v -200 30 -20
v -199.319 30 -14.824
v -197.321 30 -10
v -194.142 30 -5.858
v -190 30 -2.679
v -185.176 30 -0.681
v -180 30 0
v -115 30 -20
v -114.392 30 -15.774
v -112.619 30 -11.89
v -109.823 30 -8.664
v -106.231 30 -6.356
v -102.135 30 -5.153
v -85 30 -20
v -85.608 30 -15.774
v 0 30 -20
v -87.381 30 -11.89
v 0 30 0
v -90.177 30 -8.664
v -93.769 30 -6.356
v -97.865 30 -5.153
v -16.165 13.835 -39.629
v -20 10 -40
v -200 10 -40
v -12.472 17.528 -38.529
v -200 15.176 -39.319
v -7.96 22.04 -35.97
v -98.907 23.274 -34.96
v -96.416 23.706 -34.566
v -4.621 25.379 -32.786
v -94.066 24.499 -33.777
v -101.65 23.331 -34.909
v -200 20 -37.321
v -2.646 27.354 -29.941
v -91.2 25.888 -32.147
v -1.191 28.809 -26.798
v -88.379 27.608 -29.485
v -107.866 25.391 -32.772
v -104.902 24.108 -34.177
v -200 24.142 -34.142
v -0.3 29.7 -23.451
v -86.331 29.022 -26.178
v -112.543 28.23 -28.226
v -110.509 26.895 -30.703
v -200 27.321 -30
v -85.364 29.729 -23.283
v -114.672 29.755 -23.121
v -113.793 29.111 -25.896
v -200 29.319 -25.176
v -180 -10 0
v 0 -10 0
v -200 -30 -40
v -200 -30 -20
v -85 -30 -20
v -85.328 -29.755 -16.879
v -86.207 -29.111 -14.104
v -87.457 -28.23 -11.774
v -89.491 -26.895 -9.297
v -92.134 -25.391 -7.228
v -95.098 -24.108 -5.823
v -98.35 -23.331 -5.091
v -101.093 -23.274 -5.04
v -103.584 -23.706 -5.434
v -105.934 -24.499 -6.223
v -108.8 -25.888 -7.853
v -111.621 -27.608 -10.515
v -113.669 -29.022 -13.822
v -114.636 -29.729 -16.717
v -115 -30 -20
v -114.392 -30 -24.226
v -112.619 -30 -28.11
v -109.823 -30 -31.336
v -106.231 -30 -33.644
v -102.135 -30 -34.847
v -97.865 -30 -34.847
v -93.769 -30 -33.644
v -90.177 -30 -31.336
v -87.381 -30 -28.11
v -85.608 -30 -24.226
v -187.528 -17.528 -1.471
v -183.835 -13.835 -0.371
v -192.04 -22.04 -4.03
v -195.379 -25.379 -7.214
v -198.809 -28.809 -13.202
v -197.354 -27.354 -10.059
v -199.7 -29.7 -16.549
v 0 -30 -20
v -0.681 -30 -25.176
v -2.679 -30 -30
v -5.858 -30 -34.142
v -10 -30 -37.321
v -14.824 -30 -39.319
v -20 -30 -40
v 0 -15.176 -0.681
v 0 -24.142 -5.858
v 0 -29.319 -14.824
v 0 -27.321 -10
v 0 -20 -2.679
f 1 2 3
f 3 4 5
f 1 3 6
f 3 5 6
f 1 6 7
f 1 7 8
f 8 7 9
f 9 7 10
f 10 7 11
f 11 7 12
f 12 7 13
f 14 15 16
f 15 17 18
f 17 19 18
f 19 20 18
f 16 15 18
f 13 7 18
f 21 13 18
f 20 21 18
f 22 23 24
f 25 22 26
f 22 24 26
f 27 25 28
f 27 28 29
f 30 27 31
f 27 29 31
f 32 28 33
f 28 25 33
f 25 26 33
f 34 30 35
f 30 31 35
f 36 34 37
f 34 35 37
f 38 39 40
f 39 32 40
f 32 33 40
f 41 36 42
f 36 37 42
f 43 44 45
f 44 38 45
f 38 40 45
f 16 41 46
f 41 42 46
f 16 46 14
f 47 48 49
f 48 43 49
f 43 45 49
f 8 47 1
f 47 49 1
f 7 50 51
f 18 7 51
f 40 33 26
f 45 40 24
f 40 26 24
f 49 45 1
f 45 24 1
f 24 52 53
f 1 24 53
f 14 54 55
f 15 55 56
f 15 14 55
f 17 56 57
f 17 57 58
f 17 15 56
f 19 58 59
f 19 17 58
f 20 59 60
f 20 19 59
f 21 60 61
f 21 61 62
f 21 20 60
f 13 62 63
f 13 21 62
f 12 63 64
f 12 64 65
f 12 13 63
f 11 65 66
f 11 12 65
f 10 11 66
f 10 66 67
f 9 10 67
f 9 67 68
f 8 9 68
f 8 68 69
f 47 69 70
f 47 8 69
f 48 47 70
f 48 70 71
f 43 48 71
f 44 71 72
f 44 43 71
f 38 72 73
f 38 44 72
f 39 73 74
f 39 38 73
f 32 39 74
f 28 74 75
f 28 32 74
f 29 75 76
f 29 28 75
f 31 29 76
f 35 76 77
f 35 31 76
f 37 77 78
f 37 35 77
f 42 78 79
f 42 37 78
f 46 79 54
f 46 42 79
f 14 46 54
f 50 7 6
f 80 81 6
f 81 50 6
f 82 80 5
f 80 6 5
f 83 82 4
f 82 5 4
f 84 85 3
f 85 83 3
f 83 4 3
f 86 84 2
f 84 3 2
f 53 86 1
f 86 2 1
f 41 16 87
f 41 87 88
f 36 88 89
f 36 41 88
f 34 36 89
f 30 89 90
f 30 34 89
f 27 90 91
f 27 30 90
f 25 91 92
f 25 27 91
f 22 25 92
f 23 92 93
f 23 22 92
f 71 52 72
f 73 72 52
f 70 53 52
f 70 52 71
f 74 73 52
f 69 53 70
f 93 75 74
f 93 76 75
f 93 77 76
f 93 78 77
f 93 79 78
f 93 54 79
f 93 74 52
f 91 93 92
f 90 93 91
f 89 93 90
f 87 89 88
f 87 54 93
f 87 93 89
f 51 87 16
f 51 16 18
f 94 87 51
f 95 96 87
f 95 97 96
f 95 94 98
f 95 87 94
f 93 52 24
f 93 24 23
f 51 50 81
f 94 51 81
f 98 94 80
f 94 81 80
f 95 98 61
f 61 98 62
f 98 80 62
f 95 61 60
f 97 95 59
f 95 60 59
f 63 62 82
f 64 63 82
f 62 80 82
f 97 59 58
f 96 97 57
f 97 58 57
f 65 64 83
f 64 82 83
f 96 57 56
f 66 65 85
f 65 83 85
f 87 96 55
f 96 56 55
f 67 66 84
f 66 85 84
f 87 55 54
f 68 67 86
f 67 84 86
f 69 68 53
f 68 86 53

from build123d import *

# Parameters (mm, degrees)
F0_W        = 200
F0_H        = 40
F0_R        = 15
F1_DEPTH    = 30
F2_T1_DEPTH = 160
F2_T3_DEPTH = 300


# Not quite as in the source:
# - a fillet or chamfer that OpenCascade refuses, or shapes differently, is made with other operations: its cross-section is extruded or revolved along the edge and cut away or added


with BuildPart() as f1:
    # F0 (on Front) → F1 (new body, symmetric)
    with BuildSketch(Plane.XZ):
        with Locations((-100, -20)):
            Rectangle(F0_W, F0_H)
        with Locations((-100, -20)):
            Circle(F0_R, mode=Mode.SUBTRACT)
    extrude(amount=F1_DEPTH, both=True)

    # F2: fillet of radius 20 on 4 edges, made by hand

    # F2_s2 → F2_t1 (cut)
    with BuildSketch(Plane.XZ.offset(-80)):
        with BuildLine():
            ThreePointArc((-180, 0), (-194.1421356237, -5.8578643763), (-200, -20))
            Line((-200, -20), (-200, 0))
            Line((-200, 0), (-180, 0))
        make_face()
        with BuildLine():
            ThreePointArc((0, -20), (-5.8578643763, -34.1421356237), (-20, -40))
            Line((-20, -40), (0, -40))
            Line((0, -40), (0, -20))
        make_face()
    extrude(amount=F2_T1_DEPTH, mode=Mode.SUBTRACT)

    # F2_s4 → F2_t3 (cut)
    with BuildSketch(Plane.YZ.offset(-250)):
        with BuildLine():
            ThreePointArc((-10, 0), (-24.1421356237, -5.8578643763), (-30, -20))
            Line((-30, -20), (-30, 0))
            Line((-30, 0), (-10, 0))
        make_face()
        with BuildLine():
            ThreePointArc((10, -40), (24.1421356237, -34.1421356237), (30, -20))
            Line((30, -20), (30, -40))
            Line((30, -40), (10, -40))
        make_face()
    extrude(amount=F2_T3_DEPTH, mode=Mode.SUBTRACT)


solid = f1.part
